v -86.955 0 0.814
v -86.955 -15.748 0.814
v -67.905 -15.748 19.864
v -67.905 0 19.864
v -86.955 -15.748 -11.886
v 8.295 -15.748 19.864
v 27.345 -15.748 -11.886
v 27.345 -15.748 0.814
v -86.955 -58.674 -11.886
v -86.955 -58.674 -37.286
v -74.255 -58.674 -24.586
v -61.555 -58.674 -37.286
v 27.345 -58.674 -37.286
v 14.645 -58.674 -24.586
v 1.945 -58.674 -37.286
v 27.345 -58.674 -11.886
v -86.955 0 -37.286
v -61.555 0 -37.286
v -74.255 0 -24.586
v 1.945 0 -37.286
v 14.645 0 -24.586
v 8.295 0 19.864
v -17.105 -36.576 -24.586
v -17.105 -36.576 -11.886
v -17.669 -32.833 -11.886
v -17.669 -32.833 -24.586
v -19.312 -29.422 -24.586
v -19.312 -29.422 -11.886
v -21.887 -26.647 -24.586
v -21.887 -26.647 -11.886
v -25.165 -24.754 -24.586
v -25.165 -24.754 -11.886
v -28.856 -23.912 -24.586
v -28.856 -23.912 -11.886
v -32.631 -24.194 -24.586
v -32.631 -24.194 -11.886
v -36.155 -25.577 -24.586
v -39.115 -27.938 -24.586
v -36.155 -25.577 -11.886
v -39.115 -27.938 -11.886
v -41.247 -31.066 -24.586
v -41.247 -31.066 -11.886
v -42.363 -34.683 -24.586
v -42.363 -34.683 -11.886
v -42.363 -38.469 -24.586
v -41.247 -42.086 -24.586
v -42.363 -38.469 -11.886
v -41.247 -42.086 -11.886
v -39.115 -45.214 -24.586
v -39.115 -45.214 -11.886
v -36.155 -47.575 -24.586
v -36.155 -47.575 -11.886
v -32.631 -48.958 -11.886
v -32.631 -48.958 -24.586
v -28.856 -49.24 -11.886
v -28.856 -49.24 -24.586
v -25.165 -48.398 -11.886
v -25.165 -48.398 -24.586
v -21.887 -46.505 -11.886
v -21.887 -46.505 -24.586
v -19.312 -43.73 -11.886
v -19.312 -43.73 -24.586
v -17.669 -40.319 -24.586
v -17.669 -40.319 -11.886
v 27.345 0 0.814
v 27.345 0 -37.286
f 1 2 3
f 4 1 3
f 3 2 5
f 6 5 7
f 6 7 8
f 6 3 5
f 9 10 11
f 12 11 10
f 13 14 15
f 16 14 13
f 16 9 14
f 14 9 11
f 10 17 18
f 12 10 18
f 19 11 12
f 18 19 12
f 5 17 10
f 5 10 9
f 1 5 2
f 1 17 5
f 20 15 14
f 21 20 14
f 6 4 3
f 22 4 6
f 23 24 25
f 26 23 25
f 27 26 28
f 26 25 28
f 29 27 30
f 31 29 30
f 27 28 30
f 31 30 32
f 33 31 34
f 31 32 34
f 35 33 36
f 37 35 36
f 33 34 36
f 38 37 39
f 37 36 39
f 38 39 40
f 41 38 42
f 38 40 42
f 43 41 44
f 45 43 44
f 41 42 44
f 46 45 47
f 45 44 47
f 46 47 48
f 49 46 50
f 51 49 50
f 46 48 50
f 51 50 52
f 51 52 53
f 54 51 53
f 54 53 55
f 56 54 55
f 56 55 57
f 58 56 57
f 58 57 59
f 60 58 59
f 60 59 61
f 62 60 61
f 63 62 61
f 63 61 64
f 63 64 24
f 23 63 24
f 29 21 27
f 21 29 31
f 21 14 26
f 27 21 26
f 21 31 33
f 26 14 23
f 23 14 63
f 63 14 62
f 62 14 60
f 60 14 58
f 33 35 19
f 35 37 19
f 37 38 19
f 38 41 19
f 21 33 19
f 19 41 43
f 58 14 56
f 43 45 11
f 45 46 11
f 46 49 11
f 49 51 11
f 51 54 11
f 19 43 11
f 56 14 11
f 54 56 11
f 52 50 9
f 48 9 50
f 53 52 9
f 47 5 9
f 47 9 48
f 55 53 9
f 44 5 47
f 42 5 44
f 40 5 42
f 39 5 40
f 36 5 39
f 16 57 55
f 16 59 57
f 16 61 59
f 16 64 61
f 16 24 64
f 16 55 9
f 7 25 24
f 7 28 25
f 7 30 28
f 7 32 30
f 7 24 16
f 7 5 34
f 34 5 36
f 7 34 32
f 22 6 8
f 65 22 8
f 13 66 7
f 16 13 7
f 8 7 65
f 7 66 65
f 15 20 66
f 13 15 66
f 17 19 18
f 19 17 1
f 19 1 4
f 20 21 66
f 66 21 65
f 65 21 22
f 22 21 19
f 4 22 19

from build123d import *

# Parameters (mm, degrees)
F0_W     = 114.3
F0_H     = 57.15
F1_DEPTH = 58.674
F2_W     = 114.3
F2_H     = 42.926
F3_DEPTH = 31.75
F5_DEPTH = 15.748
F7_R     = 12.7
F8_DEPTH = 25.4
F9_DEPTH = 58.674


with BuildPart() as f1:
    # F0 (on Front) → F1 (new body)
    with BuildSketch(Plane.XZ):
        with Locations((-29.805122, -8.710917)):
            Rectangle(F0_W, F0_H)
    extrude(amount=F1_DEPTH)

    # F2 (on face) → F3 (cut)
    with BuildSketch(Plane.XY.offset(19.864083)):
        with Locations((-29.805122, -37.211)):
            Rectangle(F2_W, F2_H)
    extrude(amount=-F3_DEPTH, mode=Mode.SUBTRACT)

    # F4 (on face) → F5 (cut)
    with BuildSketch(Plane.XZ.offset(15.748)):
        Polygon((27.344878, 0.814083), (27.344878, 19.864083), (8.294878, 19.864083), align=None)
        Polygon((-67.905122, 19.864083), (-86.955122, 19.864083), (-86.955122, 0.814083), align=None)
    extrude(amount=-F5_DEPTH, mode=Mode.SUBTRACT)

    # F7 (on face) → F8 (cut)
    with BuildSketch(Plane.XY.offset(-11.885917)):
        with Locations((-29.805122, -36.576)):
            Circle(F7_R)
    extrude(amount=-F8_DEPTH, mode=Mode.SUBTRACT)

    # F6 (on face) → F9 (cut)
    with BuildSketch(Plane.XZ.offset(58.674)):
        Polygon((-29.805122, -24.585917), (-29.805122, -37.285917), (1.944878, -37.285917), (14.644878, -24.585917), align=None)
        Polygon((-61.555122, -37.285917), (-29.805122, -37.285917), (-29.805122, -24.585917), (-74.255122, -24.585917), align=None)
    extrude(amount=-F9_DEPTH, mode=Mode.SUBTRACT)


solid = f1.part
